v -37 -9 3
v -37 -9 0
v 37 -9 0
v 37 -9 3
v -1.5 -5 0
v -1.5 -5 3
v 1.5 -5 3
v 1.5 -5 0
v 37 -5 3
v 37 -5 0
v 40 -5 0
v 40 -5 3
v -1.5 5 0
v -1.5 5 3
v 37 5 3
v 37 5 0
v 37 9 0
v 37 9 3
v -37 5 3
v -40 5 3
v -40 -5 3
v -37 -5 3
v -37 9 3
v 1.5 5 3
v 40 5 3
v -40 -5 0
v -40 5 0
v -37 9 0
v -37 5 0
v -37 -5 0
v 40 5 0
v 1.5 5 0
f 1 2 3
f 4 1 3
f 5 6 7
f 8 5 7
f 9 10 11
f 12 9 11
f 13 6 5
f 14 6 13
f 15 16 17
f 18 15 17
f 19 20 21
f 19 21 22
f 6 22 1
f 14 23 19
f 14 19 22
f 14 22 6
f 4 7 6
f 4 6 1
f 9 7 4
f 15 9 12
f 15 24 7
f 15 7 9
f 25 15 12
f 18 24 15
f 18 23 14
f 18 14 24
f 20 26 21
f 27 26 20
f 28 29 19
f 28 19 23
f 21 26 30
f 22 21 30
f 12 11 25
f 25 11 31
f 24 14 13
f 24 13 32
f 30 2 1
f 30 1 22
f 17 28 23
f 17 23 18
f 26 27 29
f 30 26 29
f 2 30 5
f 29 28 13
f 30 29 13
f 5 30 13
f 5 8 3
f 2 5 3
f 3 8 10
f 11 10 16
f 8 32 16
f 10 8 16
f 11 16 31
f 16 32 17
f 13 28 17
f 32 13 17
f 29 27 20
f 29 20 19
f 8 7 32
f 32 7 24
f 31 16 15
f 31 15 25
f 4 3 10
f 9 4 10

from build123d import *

# Parameters (mm, degrees)
SKETCH_1_W          = 3
SKETCH_1_H          = 10
SKETCH_1_W_2        = 74
SKETCH_1_H_2        = 18
EXTRUDE_1_DEPTH     = 3
SKETCH_2_W          = 3
SKETCH_2_H          = 10
CUT_EXTRUDE_1_DEPTH = 3


with BuildPart() as part:
    # 草圖1 → 填料-伸長1 (new body)
    with BuildSketch(Plane.XY):
        with Locations((-38.5, 0)):
            Rectangle(SKETCH_1_W, SKETCH_1_H)
        Rectangle(SKETCH_1_W_2, SKETCH_1_H_2)
        with Locations((38.5, 0)):
            Rectangle(SKETCH_1_W, SKETCH_1_H)
    extrude(amount=EXTRUDE_1_DEPTH)

    # 草圖2 → 除料-伸長1 (cut)
    with BuildSketch(Plane.XY.offset(3)):
        Rectangle(SKETCH_2_W, SKETCH_2_H)
    extrude(amount=-CUT_EXTRUDE_1_DEPTH, mode=Mode.SUBTRACT)


solid = part.part
